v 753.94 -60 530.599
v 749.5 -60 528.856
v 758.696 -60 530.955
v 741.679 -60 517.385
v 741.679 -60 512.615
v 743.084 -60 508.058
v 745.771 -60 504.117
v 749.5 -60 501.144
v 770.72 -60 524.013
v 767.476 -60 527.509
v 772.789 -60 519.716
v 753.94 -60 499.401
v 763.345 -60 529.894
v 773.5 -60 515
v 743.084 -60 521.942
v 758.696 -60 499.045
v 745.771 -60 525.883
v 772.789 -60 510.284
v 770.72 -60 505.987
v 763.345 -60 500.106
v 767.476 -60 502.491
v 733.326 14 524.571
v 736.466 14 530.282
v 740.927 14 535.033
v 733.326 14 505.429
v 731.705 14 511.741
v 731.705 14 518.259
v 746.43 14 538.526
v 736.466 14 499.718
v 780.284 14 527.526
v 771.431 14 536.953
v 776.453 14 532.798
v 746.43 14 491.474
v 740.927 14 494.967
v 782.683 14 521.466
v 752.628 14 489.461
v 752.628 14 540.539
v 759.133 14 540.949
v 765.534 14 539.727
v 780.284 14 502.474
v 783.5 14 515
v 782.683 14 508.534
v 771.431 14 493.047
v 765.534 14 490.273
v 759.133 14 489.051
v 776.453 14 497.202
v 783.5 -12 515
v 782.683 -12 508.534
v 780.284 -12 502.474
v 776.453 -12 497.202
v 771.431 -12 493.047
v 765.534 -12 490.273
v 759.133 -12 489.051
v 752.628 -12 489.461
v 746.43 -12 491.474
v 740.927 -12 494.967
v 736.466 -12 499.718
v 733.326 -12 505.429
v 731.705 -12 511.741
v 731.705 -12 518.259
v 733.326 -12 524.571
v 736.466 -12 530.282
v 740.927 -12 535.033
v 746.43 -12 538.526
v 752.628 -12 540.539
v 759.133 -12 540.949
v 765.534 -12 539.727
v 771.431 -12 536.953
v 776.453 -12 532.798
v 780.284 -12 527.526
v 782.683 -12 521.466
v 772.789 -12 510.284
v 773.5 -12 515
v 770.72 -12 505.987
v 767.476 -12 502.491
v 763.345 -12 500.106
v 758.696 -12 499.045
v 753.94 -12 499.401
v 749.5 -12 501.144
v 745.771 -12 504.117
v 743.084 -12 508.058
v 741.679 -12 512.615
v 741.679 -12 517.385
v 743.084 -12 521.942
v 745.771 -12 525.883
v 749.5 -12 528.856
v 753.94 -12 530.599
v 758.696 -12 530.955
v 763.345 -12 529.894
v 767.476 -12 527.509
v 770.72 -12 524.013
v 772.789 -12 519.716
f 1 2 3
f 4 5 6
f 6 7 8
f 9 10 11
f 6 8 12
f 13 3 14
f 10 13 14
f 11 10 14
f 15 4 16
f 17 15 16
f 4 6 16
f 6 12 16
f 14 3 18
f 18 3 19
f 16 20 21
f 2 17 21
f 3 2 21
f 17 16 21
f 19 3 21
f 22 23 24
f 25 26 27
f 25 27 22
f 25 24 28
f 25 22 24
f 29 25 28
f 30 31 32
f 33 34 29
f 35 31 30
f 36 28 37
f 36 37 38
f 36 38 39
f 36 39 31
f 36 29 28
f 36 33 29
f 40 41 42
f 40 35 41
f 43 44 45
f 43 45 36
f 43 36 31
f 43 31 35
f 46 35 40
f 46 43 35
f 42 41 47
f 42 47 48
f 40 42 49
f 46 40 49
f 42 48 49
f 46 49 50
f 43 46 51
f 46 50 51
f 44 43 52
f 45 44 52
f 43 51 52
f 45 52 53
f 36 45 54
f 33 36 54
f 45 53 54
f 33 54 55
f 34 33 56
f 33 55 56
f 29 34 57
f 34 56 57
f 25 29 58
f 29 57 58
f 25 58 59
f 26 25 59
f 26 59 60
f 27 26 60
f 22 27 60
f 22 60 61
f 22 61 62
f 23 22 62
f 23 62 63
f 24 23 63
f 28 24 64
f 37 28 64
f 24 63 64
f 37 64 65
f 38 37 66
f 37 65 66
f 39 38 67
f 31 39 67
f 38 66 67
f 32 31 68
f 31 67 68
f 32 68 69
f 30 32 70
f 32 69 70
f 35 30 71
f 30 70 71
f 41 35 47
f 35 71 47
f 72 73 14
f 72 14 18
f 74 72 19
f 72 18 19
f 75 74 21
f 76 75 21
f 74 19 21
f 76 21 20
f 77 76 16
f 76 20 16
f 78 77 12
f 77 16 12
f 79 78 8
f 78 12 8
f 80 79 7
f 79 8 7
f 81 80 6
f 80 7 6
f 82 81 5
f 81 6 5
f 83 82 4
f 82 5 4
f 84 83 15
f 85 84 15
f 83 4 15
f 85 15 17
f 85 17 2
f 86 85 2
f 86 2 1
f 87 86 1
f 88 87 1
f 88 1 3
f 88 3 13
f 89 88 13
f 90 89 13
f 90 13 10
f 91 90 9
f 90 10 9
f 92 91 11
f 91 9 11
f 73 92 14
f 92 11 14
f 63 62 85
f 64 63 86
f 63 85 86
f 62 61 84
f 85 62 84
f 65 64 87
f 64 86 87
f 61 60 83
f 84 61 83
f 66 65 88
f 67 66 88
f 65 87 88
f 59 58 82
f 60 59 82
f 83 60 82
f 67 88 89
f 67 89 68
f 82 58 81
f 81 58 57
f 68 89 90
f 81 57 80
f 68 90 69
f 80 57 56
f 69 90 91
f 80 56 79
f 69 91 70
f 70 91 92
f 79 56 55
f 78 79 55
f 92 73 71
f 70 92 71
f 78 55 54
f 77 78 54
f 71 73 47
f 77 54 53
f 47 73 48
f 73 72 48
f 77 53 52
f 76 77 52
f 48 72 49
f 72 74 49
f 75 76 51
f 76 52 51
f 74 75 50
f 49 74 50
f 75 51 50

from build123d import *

# Parameters (mm, degrees)
EXTRUDE_START          = -60
EXTRUDE_SKETCH_1_R     = 16
EXTRUDE_1_DEPTH        = 48
EXTRUDE_ROTATE_1_ANGLE = 90
EXTRUDE_START_2        = -12
EXTRUDE_SKETCH_2_R     = 26
EXTRUDE_2_DEPTH        = 26
EXTRUDE_ROTATE_2_ANGLE = 90


with BuildPart() as part:
    # Extrude sketch 1 → Extrude 1 (new body)
    with BuildSketch(Plane.XY.offset(EXTRUDE_START)):
        Circle(EXTRUDE_SKETCH_1_R)
    extrude(amount=EXTRUDE_1_DEPTH)


with BuildPart() as part_1:
    # Extrude rotate 1: moved
    add(part.part.rotate(Axis((0, 0, 0), (-1, 0, 0)), EXTRUDE_ROTATE_1_ANGLE))


with BuildPart() as part_2:
    # Extrude place 1: moved
    add(part_1.part.moved(Location((757.5, 0, 515))))


with BuildPart() as body_2:
    # Extrude sketch 2 → Extrude 2 (new body)
    with BuildSketch(Plane.XY.offset(EXTRUDE_START_2)):
        Circle(EXTRUDE_SKETCH_2_R)
    extrude(amount=EXTRUDE_2_DEPTH)


with BuildPart() as body_2_1:
    # Extrude rotate 2: moved
    add(body_2.part.rotate(Axis((0, 0, 0), (-1, 0, 0)), EXTRUDE_ROTATE_2_ANGLE))


with BuildPart() as body_2_2:
    # Extrude place 2: moved
    add(body_2_1.part.moved(Location((757.5, 0, 515))))


with BuildPart() as part_3:
    add(part_2.part)

    # Combine (weld / assembly of features): union body 2
    add(body_2_2.part)


solid = part_3.part
